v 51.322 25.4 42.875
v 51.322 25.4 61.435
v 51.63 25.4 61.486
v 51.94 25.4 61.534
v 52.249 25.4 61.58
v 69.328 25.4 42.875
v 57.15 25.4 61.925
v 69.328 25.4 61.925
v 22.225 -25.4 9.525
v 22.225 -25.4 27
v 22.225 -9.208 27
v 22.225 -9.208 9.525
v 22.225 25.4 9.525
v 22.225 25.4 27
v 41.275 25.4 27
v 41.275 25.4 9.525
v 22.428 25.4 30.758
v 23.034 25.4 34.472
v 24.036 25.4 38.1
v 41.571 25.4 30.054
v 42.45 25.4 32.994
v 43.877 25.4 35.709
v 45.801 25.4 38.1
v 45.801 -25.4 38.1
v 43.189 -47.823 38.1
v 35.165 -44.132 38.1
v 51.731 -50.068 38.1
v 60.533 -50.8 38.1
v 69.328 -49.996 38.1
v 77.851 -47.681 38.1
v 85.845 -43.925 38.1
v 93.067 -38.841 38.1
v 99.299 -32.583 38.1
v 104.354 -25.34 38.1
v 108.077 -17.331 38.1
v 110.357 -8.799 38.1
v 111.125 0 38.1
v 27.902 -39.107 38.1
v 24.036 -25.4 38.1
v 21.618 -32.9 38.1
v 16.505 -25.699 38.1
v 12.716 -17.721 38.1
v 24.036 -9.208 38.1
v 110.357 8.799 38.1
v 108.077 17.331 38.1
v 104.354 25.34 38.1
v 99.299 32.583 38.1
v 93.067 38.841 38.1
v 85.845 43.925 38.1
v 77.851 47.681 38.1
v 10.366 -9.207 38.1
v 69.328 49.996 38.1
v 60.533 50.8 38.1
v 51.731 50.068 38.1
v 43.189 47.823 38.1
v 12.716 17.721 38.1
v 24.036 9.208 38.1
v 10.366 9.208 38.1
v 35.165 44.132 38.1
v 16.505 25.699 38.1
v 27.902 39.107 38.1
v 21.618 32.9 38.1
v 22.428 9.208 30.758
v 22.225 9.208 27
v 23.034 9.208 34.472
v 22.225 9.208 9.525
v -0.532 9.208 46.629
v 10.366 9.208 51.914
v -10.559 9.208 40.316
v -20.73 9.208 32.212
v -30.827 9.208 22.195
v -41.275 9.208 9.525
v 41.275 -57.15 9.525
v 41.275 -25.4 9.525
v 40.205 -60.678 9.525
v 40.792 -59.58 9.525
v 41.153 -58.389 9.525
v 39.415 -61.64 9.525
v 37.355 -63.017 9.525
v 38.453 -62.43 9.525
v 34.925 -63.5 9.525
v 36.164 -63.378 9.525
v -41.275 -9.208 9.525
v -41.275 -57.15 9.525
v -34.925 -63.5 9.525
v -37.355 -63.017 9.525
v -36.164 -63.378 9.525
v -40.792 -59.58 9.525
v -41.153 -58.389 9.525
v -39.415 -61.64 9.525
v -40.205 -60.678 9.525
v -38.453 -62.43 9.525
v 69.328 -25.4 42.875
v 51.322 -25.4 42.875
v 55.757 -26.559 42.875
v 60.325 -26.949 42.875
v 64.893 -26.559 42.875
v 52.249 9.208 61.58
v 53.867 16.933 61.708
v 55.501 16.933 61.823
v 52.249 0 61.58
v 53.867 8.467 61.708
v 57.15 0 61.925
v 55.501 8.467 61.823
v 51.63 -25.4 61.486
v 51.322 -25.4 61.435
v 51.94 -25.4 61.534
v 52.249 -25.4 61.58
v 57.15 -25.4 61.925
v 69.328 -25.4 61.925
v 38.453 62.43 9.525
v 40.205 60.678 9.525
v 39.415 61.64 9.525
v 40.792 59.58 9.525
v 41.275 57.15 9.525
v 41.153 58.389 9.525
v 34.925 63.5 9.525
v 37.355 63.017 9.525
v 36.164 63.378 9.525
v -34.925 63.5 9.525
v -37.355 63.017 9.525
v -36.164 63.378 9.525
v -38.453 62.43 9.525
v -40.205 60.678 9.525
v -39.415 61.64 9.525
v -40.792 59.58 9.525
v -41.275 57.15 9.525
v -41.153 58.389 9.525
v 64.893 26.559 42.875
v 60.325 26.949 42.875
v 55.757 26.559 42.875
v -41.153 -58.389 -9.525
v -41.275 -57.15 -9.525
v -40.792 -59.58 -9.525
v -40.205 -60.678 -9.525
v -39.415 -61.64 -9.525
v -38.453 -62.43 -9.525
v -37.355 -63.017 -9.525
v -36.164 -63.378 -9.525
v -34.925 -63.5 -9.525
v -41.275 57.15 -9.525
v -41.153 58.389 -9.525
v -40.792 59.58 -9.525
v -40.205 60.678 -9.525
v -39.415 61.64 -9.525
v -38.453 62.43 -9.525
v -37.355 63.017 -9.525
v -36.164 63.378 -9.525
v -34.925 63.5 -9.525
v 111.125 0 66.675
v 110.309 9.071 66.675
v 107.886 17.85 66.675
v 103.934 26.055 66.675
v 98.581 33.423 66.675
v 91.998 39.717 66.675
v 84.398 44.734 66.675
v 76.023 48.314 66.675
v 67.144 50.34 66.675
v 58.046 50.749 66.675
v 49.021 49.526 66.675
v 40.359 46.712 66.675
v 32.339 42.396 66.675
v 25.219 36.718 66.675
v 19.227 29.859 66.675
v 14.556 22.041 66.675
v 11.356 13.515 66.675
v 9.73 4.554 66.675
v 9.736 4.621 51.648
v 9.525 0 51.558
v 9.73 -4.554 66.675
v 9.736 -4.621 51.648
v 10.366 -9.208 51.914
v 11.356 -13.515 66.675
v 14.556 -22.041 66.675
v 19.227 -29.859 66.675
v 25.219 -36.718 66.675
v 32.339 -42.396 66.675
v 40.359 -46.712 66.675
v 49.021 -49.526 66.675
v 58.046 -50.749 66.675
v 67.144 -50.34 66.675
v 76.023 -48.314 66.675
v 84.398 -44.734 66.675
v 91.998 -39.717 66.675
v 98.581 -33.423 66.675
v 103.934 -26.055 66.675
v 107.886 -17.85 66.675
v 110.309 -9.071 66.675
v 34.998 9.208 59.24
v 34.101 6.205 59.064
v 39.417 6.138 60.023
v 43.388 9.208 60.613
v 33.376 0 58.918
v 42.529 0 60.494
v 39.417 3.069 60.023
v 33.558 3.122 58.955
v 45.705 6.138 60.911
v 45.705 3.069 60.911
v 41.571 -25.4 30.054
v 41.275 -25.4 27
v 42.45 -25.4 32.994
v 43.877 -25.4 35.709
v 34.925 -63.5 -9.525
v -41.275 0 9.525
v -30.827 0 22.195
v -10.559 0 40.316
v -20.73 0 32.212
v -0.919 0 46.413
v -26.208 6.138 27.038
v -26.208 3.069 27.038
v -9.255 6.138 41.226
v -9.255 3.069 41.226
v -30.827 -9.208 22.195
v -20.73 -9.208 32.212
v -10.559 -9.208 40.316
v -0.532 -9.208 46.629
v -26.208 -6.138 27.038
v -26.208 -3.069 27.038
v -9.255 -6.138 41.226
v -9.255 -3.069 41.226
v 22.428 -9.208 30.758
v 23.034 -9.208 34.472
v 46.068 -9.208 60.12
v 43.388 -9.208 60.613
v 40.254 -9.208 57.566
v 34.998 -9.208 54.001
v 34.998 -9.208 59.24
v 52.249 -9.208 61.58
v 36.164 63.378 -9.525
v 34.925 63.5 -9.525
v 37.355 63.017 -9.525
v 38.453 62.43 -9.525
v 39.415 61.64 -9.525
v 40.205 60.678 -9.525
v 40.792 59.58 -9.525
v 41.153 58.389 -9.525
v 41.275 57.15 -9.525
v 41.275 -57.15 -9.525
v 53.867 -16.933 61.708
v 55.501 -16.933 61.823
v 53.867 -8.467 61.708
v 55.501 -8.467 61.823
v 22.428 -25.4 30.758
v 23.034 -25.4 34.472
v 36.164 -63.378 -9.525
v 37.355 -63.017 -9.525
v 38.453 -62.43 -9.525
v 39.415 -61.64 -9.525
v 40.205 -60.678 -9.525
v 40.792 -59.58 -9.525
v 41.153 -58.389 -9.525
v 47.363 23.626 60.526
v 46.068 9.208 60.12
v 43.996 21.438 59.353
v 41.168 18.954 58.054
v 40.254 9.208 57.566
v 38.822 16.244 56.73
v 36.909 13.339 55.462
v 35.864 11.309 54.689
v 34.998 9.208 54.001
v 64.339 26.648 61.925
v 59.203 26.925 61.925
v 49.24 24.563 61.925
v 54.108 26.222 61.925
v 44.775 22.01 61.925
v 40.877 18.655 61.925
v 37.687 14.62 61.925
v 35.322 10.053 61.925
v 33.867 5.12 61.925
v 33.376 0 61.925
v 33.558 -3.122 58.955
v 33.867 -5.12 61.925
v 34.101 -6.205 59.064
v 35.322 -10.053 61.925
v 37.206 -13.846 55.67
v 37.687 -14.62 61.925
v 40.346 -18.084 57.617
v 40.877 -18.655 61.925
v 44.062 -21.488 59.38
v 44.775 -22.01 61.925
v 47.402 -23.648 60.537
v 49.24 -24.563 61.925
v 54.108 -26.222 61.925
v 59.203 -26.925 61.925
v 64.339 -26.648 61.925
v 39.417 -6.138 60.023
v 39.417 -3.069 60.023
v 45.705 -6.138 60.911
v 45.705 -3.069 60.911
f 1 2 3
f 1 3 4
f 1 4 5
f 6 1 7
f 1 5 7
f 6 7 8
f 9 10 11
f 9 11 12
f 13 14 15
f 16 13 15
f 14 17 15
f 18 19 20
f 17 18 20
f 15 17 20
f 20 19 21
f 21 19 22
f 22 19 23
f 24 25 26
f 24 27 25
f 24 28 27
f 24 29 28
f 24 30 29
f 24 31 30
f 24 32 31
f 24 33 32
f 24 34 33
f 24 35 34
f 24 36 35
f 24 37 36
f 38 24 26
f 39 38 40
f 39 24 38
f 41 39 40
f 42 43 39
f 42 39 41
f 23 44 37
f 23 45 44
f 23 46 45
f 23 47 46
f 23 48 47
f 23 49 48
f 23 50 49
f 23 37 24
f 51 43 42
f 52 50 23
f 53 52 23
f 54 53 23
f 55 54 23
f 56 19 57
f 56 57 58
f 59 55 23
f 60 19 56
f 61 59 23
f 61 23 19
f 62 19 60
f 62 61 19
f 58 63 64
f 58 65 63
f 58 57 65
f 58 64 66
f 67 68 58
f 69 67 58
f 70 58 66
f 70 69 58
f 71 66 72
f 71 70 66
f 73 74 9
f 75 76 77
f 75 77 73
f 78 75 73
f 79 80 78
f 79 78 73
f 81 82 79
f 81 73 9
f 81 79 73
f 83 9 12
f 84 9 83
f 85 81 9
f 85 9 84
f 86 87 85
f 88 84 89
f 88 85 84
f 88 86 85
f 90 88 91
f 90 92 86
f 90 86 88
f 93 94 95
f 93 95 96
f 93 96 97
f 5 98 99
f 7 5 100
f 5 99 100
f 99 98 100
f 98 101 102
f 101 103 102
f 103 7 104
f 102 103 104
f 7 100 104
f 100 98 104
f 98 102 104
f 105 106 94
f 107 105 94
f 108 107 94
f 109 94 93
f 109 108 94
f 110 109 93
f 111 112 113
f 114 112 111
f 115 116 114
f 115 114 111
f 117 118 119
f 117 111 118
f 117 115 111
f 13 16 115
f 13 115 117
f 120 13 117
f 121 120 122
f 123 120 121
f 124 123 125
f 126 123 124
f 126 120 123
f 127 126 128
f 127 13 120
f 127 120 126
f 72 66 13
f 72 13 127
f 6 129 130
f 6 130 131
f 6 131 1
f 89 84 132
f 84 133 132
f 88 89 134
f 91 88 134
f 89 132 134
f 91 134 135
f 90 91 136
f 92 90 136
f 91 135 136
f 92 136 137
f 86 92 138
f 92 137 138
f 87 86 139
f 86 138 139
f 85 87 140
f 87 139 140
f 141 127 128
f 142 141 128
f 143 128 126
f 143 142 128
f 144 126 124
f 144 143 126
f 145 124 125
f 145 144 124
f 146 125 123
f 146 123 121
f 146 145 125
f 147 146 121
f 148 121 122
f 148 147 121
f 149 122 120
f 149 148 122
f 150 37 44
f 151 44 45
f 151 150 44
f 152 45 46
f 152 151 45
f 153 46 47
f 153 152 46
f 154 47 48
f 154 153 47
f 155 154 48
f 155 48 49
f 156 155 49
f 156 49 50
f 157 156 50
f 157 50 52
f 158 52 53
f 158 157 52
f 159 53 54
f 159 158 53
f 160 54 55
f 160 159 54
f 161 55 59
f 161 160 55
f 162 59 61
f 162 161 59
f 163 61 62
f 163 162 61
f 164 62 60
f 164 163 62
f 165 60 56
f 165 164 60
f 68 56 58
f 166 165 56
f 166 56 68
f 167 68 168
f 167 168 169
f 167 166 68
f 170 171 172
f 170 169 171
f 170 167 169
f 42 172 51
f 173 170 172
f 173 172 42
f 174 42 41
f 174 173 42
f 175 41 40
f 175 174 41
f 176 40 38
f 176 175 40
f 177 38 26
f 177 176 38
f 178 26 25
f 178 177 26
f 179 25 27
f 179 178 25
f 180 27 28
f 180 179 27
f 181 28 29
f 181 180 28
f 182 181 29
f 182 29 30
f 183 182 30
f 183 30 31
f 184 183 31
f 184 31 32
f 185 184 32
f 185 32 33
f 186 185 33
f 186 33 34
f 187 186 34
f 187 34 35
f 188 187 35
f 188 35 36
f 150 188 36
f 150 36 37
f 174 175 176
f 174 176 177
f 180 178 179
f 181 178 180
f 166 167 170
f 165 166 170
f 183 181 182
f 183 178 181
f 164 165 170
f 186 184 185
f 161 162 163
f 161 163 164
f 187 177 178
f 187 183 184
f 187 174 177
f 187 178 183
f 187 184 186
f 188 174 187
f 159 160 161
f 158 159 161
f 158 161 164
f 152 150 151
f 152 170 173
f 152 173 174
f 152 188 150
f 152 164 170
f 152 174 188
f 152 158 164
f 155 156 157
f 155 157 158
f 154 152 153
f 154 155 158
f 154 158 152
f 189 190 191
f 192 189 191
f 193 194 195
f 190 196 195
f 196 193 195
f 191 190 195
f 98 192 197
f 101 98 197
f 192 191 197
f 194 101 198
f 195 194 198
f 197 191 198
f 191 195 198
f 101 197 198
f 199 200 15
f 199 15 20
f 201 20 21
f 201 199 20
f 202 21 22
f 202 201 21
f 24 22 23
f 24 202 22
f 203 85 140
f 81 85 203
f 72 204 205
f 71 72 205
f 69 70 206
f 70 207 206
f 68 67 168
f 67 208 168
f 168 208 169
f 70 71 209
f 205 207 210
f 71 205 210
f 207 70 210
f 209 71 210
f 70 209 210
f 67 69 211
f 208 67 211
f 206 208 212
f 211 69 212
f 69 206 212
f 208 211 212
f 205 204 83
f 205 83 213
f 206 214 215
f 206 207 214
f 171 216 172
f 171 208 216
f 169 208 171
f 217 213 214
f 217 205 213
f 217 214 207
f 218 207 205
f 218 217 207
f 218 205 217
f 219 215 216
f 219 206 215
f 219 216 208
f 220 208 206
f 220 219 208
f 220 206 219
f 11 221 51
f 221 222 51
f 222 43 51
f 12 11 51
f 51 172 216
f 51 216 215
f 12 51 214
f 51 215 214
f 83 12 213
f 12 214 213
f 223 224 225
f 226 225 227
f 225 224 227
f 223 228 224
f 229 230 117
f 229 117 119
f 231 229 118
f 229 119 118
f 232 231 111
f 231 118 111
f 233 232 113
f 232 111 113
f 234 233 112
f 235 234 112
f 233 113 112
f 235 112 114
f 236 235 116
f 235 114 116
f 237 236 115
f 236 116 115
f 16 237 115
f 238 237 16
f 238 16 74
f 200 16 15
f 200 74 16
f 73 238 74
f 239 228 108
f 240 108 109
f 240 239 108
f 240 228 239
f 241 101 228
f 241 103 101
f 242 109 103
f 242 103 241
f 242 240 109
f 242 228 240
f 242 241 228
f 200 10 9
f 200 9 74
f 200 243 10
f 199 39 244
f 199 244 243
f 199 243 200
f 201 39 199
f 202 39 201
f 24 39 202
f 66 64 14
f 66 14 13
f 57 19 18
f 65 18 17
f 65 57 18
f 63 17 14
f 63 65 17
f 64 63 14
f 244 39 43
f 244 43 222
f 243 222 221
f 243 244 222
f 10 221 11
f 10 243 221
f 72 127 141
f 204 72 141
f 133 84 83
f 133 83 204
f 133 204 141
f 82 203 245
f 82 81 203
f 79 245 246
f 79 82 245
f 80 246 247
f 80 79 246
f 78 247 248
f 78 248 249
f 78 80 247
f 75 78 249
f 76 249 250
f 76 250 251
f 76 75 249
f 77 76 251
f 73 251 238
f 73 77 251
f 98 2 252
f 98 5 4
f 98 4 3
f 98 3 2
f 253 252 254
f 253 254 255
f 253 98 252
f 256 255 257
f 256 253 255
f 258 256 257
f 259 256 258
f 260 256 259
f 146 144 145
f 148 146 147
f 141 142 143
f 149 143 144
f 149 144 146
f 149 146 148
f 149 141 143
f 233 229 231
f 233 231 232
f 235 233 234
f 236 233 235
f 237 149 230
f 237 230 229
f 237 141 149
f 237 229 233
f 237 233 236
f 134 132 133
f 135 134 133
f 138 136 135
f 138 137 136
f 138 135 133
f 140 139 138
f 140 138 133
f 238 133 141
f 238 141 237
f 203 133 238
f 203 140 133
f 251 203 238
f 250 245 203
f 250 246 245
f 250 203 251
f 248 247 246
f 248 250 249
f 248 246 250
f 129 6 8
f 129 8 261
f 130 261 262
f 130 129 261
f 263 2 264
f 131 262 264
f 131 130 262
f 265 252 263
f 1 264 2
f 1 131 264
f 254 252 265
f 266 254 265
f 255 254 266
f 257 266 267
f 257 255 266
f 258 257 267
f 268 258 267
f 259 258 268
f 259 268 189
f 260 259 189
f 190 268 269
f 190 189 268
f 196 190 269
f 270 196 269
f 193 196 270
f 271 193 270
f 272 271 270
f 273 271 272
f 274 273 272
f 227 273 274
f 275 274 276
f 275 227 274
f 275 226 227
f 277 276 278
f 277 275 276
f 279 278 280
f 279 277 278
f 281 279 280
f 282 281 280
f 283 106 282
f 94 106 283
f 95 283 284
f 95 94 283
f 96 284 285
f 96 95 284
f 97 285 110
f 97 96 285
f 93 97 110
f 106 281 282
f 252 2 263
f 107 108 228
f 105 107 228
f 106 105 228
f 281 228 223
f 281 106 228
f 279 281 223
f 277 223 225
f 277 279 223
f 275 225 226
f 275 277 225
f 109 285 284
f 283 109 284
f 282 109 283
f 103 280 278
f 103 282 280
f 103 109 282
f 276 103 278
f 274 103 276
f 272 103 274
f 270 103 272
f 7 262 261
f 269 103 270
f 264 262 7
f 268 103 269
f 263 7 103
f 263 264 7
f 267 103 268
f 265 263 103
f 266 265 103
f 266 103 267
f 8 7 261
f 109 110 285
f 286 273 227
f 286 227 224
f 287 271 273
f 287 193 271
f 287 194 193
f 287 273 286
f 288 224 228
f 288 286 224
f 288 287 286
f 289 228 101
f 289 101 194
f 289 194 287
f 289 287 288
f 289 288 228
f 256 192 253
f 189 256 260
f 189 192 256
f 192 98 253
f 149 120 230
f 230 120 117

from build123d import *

# Parameters (mm, degrees)
F1_DEPTH = 63.5
F0_W     = 26.9485112596
F0_H     = 19.05
F2_DEPTH = 25.4
F3_DEPTH = 9.2075
F4_R     = 6.35


with BuildPart() as f1:
    # F0 (on Front) → F1 (new body, symmetric)
    with BuildSketch(Plane.XZ):
        Polygon((-41.275, 9.525), (-41.275, -9.525), (41.275, -9.525), (41.275, 9.525), (22.225, 9.525), align=None)
    extrude(amount=F1_DEPTH, both=True)

    # F0 (on Front) → F2 (join, symmetric)
    with BuildSketch(Plane.XZ):
        with BuildLine():
            Line((22.225, 9.525), (41.275, 9.525))
            Line((41.275, 9.525), (41.275, 27.0002))
            ThreePointArc((41.275, 27.0002), (45.9246798487, 38.2255201513), (57.15, 42.8752))
            Line((57.15, 42.8752), (60.325, 42.8752))
            Line((60.325, 42.8752), (60.325, 61.9252))
            Line((60.325, 61.9252), (57.15, 61.9252))
            add(Edge.make_bspline(
                [(52.2492096808, 61.5796430153), (53.8592655061, 61.7142223816), (55.4926449754, 61.8294562532), (57.15, 61.9252)],
                knots=[107.5950176297, 107.5950176297, 107.5950176297, 107.5950176297, 111.5045361635, 111.5045361635, 111.5045361635, 111.5045361635], degree=3))
            ThreePointArc((52.2492096808, 61.5796430153), (30.7784649015, 49.8977492477), (22.225, 27.0002))
            Line((22.225, 27.0002), (22.225, 9.525))
        make_face()
        with Locations((73.7992556298, 52.4002)):
            Rectangle(F0_W, F0_H)
    extrude(amount=F2_DEPTH, both=True)

    # F0 (on Front) → F3 (join, symmetric)
    with BuildSketch(Plane.XZ):
        with BuildLine():
            add(Edge.make_bspline(
                [(-41.275, 9.525), (-18.7066018439, 39.5193474562), (7.9383863878, 57.8758444109), (52.2492096808, 61.5796430153)],
                knots=[0, 0, 0, 0, 107.5950176297, 107.5950176297, 107.5950176297, 107.5950176297], degree=3))
            Line((-41.275, 9.525), (22.225, 9.525))
            Line((22.225, 9.525), (22.225, 27.0002))
            ThreePointArc((22.225, 27.0002), (30.7784649015, 49.8977492477), (52.2492096808, 61.5796430153))
        make_face()
    extrude(amount=F3_DEPTH, both=True)

    # F4
    f4_edges = [f1.edges().sort_by_distance(p)[0] for p in [
        (-41.275, -63.5, 0),
        (41.275, -63.5, 0),
        (41.275, 63.5, 0),
        (-41.275, 63.5, 0),
    ]]
    fillet(f4_edges, radius=F4_R)

    # F0 (on Front) → F5 (revolve)
    with BuildSketch(Plane.XZ):
        Polygon((60.325, 66.675), (60.325, 61.9252), (87.2735112596, 61.9252), (87.2735112596, 42.8752), (60.325, 42.8752), (60.325, 38.1), (111.125, 38.1), (111.125, 66.675), align=None)
    revolve(axis=Axis((60.325, 0, 52.3875), (0, 0, 1)))


solid = f1.part
